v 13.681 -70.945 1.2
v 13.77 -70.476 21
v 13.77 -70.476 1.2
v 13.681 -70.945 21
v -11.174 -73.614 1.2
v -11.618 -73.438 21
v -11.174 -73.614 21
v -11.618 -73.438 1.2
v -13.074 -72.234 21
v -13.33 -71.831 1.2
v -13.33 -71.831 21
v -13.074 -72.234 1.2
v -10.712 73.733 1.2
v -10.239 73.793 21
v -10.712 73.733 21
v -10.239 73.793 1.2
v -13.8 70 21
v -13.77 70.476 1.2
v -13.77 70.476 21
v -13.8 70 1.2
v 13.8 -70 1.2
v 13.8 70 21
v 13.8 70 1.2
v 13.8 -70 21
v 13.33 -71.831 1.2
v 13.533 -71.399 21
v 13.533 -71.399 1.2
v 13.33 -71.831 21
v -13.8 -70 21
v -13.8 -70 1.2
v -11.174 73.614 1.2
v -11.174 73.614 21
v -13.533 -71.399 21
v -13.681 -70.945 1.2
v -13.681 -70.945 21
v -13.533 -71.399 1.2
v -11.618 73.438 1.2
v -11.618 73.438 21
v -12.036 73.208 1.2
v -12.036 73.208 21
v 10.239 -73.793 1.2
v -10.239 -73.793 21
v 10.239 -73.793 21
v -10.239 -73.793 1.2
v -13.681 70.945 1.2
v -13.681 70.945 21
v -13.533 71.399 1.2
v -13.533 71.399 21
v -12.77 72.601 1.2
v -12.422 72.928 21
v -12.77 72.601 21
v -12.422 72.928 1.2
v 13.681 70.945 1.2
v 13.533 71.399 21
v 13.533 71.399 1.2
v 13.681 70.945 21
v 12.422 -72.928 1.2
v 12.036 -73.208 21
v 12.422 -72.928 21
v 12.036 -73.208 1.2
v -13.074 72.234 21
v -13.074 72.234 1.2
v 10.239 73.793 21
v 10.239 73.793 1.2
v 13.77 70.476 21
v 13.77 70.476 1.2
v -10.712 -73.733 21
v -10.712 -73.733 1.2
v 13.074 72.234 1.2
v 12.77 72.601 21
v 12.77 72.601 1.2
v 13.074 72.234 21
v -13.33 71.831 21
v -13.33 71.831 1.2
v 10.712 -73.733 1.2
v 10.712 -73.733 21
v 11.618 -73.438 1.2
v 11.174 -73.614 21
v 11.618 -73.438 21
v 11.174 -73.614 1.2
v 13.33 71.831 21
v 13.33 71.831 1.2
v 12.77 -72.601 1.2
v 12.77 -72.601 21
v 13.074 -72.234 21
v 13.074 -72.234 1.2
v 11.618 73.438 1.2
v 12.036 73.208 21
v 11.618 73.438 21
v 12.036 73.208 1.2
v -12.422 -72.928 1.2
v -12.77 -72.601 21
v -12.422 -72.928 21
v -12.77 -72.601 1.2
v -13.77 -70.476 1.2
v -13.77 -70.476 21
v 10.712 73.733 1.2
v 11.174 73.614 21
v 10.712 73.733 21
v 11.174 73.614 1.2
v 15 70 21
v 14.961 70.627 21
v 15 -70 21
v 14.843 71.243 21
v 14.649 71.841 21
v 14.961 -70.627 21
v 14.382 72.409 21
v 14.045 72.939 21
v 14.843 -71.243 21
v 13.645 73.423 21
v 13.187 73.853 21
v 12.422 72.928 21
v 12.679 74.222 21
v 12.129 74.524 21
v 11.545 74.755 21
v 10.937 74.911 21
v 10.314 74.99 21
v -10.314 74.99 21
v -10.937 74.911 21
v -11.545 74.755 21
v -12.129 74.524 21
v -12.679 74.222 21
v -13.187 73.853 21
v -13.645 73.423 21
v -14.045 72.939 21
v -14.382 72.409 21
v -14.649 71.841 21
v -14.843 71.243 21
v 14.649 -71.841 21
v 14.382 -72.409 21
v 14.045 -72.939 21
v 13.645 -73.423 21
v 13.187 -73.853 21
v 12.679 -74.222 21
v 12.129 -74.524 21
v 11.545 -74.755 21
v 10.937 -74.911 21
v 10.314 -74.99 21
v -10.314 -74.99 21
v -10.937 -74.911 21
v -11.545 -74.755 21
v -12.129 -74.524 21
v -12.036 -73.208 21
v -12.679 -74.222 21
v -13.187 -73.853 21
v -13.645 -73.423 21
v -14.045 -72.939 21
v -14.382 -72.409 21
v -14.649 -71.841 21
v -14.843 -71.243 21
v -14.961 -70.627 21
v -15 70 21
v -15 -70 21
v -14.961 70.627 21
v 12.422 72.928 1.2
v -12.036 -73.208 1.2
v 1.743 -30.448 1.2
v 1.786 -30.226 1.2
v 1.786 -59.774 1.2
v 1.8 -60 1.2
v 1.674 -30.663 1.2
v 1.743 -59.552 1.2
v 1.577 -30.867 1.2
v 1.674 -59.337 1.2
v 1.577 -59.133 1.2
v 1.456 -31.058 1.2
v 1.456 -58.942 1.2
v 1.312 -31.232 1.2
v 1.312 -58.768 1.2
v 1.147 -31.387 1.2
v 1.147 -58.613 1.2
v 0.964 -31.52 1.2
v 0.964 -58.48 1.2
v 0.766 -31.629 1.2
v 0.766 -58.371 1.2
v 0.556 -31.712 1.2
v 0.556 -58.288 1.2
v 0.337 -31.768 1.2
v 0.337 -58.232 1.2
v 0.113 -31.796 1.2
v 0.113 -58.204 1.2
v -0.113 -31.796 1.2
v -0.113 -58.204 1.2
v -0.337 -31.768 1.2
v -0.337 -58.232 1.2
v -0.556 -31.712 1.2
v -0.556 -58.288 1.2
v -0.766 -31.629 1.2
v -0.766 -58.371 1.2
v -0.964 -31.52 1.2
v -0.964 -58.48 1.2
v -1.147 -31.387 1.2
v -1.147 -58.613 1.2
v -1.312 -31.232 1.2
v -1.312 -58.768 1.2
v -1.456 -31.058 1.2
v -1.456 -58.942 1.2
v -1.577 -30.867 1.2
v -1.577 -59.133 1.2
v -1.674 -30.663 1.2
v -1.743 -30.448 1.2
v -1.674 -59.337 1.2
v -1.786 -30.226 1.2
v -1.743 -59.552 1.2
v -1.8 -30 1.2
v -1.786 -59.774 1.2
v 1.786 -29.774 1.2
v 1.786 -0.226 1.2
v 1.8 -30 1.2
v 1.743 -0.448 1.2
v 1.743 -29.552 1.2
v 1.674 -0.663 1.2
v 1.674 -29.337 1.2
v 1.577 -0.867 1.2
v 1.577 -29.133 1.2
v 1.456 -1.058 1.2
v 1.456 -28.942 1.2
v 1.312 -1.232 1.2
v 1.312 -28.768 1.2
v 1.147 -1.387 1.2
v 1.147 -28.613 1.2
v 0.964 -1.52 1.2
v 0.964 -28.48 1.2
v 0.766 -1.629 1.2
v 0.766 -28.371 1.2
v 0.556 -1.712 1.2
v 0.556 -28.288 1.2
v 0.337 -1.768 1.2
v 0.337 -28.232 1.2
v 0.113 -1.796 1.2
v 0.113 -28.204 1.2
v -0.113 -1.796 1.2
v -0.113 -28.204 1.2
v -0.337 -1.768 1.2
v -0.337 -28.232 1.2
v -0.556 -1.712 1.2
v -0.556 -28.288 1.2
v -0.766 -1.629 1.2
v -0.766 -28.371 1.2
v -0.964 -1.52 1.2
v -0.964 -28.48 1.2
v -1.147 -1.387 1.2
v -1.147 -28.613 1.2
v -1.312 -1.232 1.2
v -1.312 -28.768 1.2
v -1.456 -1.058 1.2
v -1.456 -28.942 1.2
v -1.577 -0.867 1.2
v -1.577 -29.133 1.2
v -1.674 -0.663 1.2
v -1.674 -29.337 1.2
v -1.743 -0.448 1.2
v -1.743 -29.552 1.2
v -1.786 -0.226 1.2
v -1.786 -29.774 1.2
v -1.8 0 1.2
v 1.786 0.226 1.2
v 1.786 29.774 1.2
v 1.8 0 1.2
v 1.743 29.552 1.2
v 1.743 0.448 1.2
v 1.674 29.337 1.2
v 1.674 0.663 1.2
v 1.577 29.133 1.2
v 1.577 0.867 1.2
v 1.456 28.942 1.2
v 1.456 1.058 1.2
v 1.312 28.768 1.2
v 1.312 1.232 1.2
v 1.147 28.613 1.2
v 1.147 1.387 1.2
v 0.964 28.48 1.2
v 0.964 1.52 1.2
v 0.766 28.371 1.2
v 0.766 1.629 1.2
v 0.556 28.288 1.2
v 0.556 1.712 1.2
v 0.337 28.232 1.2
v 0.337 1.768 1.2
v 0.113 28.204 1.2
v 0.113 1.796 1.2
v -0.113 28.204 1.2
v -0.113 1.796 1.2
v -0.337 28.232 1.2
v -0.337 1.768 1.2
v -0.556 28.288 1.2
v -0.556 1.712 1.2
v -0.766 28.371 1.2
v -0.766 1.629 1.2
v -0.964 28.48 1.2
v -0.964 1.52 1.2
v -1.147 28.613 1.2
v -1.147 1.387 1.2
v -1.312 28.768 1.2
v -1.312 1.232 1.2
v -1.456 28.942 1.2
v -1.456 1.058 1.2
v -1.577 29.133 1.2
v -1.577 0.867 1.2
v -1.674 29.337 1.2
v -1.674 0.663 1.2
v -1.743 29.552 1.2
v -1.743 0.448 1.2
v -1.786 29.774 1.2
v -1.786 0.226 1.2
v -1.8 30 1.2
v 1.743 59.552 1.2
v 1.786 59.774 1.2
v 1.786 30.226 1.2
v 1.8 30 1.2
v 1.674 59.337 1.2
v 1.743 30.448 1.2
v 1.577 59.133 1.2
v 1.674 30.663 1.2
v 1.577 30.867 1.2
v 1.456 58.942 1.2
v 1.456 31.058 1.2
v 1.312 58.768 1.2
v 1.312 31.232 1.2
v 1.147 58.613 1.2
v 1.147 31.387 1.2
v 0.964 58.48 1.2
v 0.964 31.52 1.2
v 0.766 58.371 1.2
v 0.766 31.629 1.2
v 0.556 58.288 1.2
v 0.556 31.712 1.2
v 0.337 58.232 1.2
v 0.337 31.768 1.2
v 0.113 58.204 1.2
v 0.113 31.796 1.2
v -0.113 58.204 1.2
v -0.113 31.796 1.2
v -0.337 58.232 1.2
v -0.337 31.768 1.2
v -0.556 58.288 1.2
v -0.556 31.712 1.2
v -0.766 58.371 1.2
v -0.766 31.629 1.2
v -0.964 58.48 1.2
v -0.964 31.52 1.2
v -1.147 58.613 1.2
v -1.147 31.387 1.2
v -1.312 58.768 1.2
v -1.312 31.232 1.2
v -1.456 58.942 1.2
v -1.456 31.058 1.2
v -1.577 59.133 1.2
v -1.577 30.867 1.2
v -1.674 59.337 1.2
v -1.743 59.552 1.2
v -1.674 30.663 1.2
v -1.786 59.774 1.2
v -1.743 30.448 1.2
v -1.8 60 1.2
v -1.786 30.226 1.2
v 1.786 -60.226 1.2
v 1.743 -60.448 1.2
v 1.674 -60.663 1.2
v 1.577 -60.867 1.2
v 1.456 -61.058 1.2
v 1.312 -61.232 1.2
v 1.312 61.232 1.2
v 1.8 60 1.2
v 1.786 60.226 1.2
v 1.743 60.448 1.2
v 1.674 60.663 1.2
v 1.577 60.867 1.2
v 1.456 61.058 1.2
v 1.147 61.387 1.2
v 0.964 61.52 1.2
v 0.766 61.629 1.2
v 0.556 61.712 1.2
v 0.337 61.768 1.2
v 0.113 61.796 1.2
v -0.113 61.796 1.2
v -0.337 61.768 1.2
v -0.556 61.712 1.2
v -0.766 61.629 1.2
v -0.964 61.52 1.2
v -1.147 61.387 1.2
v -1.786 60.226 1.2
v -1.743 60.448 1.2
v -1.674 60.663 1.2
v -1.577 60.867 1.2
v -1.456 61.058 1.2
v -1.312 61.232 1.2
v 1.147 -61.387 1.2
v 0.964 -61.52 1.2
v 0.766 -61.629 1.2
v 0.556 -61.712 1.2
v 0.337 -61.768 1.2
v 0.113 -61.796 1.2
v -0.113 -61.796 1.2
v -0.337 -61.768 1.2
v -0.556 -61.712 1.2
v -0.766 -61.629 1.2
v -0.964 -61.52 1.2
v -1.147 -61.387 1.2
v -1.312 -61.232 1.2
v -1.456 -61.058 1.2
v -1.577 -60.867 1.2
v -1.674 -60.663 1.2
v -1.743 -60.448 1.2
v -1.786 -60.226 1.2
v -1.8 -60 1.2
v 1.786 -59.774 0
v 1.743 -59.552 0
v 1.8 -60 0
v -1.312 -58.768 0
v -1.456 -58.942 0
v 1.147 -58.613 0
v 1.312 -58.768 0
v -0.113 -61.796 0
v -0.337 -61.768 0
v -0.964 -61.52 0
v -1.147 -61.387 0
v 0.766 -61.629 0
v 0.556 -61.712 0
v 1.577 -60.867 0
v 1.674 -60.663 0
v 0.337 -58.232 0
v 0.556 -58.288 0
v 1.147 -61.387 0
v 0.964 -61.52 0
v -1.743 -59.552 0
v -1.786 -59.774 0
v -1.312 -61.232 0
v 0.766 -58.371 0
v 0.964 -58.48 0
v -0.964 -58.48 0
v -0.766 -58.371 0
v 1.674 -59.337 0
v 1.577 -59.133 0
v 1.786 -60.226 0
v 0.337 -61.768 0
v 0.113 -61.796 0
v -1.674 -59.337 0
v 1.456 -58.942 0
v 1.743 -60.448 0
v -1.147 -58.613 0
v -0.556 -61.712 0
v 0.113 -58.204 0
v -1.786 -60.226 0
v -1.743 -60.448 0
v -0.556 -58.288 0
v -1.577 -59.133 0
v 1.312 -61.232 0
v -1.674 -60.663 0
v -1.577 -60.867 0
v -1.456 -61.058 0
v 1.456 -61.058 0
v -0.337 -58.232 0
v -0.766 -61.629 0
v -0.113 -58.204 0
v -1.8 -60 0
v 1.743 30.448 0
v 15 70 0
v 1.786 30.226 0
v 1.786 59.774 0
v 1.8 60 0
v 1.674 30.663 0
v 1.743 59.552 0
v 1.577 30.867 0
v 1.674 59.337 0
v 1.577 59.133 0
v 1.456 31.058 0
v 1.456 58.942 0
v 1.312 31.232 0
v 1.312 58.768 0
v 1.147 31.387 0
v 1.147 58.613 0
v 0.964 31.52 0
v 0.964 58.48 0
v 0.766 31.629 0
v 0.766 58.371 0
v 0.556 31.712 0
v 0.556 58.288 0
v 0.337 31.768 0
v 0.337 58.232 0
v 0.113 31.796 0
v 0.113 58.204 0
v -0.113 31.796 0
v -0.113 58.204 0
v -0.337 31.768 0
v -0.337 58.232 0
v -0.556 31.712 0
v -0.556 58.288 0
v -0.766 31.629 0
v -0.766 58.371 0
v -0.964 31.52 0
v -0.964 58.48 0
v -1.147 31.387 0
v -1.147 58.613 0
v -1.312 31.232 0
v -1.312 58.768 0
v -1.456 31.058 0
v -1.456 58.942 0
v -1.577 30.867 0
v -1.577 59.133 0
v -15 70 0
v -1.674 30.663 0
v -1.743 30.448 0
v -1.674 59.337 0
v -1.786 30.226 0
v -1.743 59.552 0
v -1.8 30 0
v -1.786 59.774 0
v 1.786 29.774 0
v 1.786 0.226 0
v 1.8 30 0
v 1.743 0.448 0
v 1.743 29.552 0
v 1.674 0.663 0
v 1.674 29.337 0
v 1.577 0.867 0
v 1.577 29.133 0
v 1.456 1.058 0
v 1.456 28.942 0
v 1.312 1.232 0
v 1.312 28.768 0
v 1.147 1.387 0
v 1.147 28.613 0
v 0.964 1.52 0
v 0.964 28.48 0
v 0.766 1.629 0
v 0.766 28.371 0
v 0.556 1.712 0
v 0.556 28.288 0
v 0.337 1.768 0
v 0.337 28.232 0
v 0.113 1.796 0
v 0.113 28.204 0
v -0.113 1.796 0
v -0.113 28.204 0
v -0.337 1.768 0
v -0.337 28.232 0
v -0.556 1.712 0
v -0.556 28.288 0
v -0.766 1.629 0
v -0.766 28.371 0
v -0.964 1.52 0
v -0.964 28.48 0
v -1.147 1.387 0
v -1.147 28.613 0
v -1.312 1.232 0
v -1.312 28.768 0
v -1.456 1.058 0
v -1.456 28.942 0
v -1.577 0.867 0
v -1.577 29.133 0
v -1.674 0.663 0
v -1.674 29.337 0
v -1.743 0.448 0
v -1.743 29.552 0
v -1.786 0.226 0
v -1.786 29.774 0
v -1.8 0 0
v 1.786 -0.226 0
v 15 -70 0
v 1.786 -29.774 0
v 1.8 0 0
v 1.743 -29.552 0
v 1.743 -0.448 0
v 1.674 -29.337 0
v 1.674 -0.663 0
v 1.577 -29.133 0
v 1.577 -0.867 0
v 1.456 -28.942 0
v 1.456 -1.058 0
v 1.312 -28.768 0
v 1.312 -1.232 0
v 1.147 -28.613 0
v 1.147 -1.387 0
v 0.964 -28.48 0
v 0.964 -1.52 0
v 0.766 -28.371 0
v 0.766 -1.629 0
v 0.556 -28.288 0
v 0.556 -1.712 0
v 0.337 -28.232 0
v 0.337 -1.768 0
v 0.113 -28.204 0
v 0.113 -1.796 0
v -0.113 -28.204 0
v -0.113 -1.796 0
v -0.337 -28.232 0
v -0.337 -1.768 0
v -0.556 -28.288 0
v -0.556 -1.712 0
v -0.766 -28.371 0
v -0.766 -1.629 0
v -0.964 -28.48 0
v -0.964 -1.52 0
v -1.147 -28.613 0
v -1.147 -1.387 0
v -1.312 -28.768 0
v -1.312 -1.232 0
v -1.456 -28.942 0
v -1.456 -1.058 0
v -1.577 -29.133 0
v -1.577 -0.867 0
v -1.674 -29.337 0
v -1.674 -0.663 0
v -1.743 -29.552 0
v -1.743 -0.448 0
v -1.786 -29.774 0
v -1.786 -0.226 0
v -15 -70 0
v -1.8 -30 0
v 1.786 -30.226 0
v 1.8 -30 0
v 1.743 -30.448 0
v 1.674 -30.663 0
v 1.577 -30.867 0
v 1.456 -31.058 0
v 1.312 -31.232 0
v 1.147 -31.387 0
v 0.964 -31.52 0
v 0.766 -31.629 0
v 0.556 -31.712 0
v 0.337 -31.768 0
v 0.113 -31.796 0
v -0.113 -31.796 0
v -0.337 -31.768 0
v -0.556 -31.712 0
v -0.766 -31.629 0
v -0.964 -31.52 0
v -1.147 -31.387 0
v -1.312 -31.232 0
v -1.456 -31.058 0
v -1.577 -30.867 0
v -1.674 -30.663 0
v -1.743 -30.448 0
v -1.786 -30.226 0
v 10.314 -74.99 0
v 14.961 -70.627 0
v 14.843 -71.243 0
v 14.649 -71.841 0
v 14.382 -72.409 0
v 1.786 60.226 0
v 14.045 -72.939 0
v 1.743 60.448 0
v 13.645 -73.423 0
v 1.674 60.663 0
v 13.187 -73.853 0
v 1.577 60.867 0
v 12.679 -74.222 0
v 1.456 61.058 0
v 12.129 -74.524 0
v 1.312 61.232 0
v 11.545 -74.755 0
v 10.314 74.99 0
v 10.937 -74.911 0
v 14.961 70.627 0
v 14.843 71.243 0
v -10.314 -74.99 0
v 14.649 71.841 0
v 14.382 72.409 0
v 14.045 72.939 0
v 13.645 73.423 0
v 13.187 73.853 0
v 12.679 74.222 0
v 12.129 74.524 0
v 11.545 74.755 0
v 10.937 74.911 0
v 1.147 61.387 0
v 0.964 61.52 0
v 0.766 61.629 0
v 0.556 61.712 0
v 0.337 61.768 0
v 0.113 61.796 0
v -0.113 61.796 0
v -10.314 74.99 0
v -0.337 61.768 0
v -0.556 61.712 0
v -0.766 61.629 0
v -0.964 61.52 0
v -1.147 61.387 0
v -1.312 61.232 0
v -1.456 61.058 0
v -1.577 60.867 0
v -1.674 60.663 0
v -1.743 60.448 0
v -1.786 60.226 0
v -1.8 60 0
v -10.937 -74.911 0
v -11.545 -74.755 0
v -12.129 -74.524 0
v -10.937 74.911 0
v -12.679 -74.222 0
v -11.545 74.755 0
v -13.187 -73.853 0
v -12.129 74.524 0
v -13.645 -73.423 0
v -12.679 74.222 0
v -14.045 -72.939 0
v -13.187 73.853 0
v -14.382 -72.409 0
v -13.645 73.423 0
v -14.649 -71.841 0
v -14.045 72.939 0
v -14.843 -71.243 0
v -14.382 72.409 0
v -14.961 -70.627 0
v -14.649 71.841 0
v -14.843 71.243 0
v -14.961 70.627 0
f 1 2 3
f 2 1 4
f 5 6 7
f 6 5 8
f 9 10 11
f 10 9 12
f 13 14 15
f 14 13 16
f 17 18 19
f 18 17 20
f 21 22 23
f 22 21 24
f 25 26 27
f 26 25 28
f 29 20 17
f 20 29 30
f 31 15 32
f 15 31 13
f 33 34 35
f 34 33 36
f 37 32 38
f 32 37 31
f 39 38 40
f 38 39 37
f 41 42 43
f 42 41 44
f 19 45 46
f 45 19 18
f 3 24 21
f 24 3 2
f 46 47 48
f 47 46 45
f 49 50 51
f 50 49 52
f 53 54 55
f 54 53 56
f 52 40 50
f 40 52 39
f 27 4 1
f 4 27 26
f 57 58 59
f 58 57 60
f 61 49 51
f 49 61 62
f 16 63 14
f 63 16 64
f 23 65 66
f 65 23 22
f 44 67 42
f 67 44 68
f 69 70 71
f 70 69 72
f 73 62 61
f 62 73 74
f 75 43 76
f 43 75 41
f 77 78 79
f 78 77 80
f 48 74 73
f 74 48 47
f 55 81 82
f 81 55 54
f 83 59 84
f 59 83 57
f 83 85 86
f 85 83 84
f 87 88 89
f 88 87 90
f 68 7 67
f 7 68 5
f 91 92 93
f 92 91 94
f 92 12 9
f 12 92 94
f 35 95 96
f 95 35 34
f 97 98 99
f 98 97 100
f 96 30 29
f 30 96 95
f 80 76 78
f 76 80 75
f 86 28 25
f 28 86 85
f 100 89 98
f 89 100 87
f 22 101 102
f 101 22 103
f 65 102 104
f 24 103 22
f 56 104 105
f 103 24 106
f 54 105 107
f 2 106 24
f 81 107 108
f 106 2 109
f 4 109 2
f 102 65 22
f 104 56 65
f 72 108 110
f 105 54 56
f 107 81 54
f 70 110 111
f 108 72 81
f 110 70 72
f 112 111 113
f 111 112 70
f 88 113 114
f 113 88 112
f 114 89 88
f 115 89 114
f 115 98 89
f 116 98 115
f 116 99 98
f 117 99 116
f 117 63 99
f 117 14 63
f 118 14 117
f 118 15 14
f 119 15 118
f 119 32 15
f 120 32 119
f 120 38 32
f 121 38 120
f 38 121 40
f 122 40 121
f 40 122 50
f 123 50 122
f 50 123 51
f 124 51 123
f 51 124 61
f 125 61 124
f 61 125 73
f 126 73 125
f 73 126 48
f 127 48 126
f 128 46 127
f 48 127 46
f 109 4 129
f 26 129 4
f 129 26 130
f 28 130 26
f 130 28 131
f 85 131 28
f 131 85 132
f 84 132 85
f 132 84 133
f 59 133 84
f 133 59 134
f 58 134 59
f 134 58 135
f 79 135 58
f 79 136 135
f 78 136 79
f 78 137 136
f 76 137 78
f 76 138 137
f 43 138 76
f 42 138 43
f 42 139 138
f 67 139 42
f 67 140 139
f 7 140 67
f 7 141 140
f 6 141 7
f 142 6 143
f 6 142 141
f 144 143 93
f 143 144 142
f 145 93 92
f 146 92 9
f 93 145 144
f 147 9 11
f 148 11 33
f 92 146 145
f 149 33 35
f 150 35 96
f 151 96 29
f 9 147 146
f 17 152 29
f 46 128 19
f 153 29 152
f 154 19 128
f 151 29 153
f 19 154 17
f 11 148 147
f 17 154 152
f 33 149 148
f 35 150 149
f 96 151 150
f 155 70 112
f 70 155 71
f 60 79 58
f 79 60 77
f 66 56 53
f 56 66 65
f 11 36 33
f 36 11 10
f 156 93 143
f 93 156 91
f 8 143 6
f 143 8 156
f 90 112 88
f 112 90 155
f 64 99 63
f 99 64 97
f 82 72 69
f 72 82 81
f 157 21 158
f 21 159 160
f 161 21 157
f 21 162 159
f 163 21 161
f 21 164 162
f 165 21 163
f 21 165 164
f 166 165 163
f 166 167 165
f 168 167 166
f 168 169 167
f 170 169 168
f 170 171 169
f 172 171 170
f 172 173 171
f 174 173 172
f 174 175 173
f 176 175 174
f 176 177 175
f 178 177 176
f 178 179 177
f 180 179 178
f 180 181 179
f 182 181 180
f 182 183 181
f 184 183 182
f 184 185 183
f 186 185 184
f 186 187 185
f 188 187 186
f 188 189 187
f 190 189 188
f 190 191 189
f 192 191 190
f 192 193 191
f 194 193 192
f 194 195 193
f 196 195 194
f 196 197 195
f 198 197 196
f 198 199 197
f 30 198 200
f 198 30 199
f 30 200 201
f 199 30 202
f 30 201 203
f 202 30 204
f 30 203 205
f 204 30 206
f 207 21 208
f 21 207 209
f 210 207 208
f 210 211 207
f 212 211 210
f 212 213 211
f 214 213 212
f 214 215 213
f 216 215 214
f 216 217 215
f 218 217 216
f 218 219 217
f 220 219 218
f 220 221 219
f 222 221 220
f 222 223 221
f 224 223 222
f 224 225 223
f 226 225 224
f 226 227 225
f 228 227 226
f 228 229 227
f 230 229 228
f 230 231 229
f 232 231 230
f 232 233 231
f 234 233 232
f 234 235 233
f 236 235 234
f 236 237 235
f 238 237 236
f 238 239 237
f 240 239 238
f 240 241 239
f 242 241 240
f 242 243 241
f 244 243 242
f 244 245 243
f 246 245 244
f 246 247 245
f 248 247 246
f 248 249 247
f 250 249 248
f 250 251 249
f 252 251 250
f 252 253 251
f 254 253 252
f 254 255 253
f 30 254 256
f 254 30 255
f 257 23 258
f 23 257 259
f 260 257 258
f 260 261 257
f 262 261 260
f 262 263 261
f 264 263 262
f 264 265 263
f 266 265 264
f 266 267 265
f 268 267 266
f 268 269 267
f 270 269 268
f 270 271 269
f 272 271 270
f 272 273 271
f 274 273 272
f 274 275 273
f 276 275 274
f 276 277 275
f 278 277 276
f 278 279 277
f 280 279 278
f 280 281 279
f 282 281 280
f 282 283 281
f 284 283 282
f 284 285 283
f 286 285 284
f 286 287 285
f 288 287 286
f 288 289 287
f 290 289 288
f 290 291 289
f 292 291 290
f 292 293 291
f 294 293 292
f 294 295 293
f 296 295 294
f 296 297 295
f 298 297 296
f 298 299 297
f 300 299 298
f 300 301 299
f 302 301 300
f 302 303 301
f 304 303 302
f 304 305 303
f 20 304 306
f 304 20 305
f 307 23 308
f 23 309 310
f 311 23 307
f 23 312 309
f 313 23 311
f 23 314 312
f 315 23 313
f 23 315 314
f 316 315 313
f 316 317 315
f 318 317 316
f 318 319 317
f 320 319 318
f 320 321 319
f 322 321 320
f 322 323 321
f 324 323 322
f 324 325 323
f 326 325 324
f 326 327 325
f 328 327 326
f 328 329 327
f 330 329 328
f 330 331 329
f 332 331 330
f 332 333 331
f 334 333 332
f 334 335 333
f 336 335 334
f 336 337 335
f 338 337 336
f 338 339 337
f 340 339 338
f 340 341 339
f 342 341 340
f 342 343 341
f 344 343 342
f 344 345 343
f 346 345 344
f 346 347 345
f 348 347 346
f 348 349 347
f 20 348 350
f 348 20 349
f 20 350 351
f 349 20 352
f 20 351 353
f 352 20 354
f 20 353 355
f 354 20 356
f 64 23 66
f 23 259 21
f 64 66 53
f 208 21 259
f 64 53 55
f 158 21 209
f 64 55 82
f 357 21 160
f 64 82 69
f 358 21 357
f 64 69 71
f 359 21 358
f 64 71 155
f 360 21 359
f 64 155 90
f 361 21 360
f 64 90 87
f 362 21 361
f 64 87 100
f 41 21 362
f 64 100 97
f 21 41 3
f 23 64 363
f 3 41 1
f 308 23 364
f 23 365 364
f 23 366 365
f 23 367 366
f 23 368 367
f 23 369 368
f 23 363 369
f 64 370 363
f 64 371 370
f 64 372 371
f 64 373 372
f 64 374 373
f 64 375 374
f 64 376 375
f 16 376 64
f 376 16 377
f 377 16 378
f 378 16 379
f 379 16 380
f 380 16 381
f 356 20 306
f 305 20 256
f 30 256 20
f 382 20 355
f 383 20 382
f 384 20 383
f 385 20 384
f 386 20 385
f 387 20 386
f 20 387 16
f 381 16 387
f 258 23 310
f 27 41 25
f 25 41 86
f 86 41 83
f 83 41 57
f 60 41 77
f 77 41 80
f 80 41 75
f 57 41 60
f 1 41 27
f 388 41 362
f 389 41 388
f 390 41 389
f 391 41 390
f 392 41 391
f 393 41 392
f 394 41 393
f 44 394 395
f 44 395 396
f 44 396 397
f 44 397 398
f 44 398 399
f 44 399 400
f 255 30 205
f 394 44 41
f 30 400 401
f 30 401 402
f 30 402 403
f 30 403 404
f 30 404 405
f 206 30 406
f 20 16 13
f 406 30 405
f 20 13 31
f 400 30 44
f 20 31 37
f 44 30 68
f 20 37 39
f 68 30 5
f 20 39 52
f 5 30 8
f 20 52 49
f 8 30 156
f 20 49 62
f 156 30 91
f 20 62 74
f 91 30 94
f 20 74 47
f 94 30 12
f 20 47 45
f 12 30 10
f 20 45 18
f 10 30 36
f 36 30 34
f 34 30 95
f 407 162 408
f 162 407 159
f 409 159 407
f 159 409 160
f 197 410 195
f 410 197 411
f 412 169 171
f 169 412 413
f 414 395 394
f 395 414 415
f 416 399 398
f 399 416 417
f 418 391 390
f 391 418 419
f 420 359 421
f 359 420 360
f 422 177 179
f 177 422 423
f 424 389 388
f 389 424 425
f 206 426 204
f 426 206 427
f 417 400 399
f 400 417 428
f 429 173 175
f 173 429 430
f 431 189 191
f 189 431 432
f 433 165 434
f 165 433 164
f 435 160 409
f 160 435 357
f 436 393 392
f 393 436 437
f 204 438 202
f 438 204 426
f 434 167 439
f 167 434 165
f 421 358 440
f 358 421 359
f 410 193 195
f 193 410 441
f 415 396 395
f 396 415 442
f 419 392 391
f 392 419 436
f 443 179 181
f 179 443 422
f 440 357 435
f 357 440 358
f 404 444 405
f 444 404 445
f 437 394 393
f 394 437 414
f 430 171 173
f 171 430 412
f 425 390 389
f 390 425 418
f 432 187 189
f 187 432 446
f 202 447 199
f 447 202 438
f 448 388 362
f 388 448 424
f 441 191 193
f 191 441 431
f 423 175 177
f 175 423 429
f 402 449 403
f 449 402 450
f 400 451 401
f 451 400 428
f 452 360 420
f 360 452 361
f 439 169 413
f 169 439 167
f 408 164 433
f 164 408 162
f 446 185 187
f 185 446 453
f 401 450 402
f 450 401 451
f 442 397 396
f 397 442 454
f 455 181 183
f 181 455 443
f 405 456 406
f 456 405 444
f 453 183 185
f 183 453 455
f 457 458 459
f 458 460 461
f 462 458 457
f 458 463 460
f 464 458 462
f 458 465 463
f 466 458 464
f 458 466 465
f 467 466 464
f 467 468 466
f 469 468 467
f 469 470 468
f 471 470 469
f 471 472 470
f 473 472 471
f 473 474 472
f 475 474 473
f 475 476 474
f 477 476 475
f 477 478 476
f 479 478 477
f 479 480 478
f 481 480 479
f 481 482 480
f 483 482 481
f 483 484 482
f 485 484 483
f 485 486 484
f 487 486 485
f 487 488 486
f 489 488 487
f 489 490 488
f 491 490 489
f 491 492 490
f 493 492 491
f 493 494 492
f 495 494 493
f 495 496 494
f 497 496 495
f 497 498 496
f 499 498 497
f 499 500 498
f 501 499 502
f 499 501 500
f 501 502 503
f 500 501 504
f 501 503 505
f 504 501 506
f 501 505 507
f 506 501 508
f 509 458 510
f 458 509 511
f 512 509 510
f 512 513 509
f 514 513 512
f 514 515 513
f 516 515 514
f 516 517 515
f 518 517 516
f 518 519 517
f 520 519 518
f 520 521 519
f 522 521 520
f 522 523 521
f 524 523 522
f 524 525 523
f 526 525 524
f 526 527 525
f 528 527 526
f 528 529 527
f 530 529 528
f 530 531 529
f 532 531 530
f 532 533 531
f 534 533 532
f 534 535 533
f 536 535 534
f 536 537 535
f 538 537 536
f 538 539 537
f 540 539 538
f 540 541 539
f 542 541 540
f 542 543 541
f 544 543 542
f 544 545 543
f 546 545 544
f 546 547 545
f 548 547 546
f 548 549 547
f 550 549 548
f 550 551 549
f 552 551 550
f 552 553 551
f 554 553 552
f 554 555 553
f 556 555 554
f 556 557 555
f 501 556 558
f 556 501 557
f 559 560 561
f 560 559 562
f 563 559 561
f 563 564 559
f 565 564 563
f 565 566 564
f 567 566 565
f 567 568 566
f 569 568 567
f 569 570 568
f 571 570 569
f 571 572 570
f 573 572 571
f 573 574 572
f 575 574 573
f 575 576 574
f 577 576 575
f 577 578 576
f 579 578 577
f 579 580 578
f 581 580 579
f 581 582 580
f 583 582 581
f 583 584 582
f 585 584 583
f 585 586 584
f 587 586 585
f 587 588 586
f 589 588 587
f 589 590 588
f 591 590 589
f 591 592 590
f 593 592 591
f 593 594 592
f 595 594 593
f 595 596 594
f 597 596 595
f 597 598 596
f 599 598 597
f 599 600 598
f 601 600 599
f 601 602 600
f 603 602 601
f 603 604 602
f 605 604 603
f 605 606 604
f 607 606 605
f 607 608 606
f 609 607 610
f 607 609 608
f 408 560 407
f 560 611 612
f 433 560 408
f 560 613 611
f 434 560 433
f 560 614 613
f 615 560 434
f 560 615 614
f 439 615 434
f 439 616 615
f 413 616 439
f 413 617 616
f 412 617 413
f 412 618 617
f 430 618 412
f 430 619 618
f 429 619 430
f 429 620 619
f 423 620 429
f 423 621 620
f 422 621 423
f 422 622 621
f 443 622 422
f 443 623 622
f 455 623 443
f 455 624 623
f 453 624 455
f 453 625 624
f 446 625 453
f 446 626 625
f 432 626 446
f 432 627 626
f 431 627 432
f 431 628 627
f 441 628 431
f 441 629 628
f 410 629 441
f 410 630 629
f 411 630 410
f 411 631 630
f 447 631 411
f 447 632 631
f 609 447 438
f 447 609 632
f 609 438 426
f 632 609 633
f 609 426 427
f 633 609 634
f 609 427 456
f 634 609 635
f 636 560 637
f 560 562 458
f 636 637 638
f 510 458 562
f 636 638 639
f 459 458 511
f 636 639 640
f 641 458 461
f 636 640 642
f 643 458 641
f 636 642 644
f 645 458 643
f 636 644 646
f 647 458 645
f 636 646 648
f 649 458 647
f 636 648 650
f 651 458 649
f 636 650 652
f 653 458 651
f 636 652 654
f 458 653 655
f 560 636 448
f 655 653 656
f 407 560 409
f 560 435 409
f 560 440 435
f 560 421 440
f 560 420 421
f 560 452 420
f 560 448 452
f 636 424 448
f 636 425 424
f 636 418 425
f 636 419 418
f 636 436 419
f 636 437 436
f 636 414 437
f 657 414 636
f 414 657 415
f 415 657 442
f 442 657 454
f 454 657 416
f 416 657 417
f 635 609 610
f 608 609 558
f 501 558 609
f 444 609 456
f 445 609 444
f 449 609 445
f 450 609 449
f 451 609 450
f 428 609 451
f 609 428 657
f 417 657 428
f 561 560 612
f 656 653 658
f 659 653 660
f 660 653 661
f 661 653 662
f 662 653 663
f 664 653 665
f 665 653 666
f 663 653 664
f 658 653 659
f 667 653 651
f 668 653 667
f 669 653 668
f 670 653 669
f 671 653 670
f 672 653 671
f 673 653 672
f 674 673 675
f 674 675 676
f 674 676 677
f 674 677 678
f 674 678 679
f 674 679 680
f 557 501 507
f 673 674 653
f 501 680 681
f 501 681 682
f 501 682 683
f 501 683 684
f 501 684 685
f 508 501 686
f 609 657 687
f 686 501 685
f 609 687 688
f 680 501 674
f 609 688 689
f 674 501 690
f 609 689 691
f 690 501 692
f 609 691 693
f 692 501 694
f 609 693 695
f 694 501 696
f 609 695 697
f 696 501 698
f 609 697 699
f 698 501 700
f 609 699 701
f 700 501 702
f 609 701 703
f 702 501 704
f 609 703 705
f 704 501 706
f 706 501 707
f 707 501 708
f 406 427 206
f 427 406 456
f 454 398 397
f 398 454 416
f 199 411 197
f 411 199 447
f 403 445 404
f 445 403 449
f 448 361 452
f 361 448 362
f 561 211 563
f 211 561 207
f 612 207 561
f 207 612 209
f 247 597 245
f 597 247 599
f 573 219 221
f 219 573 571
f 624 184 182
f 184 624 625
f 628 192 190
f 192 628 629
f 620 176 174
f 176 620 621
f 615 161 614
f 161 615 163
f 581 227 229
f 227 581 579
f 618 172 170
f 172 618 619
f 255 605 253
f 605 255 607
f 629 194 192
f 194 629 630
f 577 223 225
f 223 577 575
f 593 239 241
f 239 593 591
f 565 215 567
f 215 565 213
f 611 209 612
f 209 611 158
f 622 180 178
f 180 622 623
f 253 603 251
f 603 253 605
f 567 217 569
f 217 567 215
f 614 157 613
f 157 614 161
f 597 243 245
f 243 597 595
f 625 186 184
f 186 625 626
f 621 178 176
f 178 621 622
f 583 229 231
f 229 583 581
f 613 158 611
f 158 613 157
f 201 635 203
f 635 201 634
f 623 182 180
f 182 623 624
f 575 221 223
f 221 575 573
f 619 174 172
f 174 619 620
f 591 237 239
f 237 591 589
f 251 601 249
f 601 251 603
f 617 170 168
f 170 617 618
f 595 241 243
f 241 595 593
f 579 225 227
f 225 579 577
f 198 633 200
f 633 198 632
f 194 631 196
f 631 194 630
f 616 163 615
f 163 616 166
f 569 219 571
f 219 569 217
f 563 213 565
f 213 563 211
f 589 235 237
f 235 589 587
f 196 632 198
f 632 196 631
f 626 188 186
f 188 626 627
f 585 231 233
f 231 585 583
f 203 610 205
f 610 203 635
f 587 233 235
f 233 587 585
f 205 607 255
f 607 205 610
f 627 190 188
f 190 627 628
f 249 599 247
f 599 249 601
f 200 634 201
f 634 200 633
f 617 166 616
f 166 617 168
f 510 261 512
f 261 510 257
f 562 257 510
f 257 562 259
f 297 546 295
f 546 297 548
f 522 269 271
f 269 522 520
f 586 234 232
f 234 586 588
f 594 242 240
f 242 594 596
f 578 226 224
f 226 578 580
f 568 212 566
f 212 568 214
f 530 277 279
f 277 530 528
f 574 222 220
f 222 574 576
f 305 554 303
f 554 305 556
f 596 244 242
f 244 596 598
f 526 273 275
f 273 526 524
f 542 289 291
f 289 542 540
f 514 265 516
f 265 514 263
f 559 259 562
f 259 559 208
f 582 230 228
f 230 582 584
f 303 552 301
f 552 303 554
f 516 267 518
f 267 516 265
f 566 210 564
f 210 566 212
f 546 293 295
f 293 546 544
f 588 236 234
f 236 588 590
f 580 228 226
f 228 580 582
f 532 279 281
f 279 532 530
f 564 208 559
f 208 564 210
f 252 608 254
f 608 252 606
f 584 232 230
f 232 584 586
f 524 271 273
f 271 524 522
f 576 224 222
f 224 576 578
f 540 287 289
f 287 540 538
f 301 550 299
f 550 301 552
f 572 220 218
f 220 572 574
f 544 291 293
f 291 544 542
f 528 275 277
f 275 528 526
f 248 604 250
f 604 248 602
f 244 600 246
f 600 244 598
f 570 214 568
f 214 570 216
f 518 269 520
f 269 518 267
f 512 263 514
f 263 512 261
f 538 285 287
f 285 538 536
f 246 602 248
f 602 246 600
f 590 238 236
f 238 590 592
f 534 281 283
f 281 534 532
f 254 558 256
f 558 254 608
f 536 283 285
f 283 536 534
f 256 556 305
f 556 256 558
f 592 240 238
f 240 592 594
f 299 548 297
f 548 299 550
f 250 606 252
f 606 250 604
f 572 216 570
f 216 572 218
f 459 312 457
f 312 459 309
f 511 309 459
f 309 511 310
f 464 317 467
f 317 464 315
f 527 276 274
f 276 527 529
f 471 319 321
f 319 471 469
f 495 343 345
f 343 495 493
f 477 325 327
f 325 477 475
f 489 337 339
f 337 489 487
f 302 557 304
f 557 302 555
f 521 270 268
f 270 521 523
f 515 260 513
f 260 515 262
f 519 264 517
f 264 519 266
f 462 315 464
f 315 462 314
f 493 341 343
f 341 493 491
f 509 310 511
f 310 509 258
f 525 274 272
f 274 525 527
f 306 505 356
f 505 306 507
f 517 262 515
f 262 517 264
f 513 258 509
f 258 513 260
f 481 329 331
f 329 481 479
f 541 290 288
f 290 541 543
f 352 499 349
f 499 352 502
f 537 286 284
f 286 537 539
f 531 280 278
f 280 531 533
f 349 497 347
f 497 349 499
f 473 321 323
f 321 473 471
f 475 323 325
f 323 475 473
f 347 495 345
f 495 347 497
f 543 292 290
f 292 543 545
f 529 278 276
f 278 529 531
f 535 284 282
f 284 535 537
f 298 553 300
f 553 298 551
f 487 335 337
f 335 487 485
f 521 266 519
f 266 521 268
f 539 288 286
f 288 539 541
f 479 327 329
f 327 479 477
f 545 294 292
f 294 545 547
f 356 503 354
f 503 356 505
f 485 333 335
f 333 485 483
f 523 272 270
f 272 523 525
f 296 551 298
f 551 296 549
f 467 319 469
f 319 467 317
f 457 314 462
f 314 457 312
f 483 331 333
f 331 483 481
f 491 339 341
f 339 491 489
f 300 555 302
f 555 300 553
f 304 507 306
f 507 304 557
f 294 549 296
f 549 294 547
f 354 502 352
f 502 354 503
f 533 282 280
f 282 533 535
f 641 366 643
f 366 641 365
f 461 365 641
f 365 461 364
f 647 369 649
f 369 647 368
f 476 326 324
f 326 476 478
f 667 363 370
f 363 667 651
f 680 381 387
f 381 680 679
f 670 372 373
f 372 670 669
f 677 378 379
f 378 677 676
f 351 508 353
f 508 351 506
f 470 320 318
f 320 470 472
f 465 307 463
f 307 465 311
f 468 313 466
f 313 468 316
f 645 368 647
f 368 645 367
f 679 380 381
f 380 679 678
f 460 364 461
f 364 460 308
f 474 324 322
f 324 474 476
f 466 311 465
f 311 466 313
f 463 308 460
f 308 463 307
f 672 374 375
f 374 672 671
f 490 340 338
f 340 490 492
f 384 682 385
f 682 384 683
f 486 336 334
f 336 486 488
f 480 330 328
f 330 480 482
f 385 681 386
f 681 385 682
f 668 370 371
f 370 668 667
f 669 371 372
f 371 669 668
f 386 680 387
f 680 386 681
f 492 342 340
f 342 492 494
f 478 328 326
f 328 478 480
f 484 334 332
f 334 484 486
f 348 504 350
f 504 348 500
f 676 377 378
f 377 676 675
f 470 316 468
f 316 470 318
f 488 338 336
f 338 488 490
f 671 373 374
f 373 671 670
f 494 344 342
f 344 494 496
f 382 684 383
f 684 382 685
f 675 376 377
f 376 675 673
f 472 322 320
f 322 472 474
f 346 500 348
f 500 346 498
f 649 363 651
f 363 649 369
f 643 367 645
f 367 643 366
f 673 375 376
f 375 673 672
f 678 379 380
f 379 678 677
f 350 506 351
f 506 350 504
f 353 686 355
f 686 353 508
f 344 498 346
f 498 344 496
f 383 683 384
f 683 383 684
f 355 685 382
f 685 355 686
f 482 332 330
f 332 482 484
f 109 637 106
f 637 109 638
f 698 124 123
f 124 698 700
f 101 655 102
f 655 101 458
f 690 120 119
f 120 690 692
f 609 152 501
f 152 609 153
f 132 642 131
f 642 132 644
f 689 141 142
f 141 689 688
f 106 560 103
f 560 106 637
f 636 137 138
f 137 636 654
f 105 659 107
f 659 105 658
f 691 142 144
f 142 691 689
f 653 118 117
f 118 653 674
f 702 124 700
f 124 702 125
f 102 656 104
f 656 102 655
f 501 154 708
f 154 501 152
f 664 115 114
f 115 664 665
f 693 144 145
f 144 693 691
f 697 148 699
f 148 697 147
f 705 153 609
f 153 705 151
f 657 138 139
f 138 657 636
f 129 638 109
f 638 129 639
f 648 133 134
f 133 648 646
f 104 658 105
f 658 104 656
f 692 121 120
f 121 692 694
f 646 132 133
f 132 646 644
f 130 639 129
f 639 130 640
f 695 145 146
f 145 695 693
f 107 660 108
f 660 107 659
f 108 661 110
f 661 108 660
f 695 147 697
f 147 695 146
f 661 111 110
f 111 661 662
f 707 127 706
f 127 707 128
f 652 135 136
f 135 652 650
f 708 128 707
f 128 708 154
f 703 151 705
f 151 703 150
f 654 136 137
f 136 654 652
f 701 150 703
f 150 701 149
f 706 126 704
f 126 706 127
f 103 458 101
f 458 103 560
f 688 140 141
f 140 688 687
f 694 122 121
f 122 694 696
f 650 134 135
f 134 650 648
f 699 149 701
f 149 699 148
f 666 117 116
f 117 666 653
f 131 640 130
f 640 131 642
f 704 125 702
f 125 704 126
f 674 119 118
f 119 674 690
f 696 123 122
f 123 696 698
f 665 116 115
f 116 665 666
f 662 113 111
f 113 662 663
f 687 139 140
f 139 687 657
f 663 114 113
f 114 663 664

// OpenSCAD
$fn = 50;


difference() {
	union() {
		hull() {
			translate(v = [-10.0000000000, 70.0000000000, 0]) {
				cylinder(h = 21, r = 5);
			}
			translate(v = [10.0000000000, 70.0000000000, 0]) {
				cylinder(h = 21, r = 5);
			}
			translate(v = [-10.0000000000, -70.0000000000, 0]) {
				cylinder(h = 21, r = 5);
			}
			translate(v = [10.0000000000, -70.0000000000, 0]) {
				cylinder(h = 21, r = 5);
			}
		}
	}
	union() {
		translate(v = [0, 0, 1.2000000000]) {
			hull() {
				translate(v = [-10.0000000000, 70.0000000000, 0]) {
					cylinder(h = 19.8000000000, r = 3.8000000000);
				}
				translate(v = [10.0000000000, 70.0000000000, 0]) {
					cylinder(h = 19.8000000000, r = 3.8000000000);
				}
				translate(v = [-10.0000000000, -70.0000000000, 0]) {
					cylinder(h = 19.8000000000, r = 3.8000000000);
				}
				translate(v = [10.0000000000, -70.0000000000, 0]) {
					cylinder(h = 19.8000000000, r = 3.8000000000);
				}
			}
		}
		#translate(v = [0.0000000000, -60.0000000000, 0]) {
			cylinder(h = 1.2000000000, r = 1.8000000000);
		}
		#translate(v = [0.0000000000, -30.0000000000, 0]) {
			cylinder(h = 1.2000000000, r = 1.8000000000);
		}
		#cylinder(h = 1.2000000000, r = 1.8000000000);
		#translate(v = [0.0000000000, 30.0000000000, 0]) {
			cylinder(h = 1.2000000000, r = 1.8000000000);
		}
		#translate(v = [0.0000000000, 60.0000000000, 0]) {
			cylinder(h = 1.2000000000, r = 1.8000000000);
		}
	}
}
